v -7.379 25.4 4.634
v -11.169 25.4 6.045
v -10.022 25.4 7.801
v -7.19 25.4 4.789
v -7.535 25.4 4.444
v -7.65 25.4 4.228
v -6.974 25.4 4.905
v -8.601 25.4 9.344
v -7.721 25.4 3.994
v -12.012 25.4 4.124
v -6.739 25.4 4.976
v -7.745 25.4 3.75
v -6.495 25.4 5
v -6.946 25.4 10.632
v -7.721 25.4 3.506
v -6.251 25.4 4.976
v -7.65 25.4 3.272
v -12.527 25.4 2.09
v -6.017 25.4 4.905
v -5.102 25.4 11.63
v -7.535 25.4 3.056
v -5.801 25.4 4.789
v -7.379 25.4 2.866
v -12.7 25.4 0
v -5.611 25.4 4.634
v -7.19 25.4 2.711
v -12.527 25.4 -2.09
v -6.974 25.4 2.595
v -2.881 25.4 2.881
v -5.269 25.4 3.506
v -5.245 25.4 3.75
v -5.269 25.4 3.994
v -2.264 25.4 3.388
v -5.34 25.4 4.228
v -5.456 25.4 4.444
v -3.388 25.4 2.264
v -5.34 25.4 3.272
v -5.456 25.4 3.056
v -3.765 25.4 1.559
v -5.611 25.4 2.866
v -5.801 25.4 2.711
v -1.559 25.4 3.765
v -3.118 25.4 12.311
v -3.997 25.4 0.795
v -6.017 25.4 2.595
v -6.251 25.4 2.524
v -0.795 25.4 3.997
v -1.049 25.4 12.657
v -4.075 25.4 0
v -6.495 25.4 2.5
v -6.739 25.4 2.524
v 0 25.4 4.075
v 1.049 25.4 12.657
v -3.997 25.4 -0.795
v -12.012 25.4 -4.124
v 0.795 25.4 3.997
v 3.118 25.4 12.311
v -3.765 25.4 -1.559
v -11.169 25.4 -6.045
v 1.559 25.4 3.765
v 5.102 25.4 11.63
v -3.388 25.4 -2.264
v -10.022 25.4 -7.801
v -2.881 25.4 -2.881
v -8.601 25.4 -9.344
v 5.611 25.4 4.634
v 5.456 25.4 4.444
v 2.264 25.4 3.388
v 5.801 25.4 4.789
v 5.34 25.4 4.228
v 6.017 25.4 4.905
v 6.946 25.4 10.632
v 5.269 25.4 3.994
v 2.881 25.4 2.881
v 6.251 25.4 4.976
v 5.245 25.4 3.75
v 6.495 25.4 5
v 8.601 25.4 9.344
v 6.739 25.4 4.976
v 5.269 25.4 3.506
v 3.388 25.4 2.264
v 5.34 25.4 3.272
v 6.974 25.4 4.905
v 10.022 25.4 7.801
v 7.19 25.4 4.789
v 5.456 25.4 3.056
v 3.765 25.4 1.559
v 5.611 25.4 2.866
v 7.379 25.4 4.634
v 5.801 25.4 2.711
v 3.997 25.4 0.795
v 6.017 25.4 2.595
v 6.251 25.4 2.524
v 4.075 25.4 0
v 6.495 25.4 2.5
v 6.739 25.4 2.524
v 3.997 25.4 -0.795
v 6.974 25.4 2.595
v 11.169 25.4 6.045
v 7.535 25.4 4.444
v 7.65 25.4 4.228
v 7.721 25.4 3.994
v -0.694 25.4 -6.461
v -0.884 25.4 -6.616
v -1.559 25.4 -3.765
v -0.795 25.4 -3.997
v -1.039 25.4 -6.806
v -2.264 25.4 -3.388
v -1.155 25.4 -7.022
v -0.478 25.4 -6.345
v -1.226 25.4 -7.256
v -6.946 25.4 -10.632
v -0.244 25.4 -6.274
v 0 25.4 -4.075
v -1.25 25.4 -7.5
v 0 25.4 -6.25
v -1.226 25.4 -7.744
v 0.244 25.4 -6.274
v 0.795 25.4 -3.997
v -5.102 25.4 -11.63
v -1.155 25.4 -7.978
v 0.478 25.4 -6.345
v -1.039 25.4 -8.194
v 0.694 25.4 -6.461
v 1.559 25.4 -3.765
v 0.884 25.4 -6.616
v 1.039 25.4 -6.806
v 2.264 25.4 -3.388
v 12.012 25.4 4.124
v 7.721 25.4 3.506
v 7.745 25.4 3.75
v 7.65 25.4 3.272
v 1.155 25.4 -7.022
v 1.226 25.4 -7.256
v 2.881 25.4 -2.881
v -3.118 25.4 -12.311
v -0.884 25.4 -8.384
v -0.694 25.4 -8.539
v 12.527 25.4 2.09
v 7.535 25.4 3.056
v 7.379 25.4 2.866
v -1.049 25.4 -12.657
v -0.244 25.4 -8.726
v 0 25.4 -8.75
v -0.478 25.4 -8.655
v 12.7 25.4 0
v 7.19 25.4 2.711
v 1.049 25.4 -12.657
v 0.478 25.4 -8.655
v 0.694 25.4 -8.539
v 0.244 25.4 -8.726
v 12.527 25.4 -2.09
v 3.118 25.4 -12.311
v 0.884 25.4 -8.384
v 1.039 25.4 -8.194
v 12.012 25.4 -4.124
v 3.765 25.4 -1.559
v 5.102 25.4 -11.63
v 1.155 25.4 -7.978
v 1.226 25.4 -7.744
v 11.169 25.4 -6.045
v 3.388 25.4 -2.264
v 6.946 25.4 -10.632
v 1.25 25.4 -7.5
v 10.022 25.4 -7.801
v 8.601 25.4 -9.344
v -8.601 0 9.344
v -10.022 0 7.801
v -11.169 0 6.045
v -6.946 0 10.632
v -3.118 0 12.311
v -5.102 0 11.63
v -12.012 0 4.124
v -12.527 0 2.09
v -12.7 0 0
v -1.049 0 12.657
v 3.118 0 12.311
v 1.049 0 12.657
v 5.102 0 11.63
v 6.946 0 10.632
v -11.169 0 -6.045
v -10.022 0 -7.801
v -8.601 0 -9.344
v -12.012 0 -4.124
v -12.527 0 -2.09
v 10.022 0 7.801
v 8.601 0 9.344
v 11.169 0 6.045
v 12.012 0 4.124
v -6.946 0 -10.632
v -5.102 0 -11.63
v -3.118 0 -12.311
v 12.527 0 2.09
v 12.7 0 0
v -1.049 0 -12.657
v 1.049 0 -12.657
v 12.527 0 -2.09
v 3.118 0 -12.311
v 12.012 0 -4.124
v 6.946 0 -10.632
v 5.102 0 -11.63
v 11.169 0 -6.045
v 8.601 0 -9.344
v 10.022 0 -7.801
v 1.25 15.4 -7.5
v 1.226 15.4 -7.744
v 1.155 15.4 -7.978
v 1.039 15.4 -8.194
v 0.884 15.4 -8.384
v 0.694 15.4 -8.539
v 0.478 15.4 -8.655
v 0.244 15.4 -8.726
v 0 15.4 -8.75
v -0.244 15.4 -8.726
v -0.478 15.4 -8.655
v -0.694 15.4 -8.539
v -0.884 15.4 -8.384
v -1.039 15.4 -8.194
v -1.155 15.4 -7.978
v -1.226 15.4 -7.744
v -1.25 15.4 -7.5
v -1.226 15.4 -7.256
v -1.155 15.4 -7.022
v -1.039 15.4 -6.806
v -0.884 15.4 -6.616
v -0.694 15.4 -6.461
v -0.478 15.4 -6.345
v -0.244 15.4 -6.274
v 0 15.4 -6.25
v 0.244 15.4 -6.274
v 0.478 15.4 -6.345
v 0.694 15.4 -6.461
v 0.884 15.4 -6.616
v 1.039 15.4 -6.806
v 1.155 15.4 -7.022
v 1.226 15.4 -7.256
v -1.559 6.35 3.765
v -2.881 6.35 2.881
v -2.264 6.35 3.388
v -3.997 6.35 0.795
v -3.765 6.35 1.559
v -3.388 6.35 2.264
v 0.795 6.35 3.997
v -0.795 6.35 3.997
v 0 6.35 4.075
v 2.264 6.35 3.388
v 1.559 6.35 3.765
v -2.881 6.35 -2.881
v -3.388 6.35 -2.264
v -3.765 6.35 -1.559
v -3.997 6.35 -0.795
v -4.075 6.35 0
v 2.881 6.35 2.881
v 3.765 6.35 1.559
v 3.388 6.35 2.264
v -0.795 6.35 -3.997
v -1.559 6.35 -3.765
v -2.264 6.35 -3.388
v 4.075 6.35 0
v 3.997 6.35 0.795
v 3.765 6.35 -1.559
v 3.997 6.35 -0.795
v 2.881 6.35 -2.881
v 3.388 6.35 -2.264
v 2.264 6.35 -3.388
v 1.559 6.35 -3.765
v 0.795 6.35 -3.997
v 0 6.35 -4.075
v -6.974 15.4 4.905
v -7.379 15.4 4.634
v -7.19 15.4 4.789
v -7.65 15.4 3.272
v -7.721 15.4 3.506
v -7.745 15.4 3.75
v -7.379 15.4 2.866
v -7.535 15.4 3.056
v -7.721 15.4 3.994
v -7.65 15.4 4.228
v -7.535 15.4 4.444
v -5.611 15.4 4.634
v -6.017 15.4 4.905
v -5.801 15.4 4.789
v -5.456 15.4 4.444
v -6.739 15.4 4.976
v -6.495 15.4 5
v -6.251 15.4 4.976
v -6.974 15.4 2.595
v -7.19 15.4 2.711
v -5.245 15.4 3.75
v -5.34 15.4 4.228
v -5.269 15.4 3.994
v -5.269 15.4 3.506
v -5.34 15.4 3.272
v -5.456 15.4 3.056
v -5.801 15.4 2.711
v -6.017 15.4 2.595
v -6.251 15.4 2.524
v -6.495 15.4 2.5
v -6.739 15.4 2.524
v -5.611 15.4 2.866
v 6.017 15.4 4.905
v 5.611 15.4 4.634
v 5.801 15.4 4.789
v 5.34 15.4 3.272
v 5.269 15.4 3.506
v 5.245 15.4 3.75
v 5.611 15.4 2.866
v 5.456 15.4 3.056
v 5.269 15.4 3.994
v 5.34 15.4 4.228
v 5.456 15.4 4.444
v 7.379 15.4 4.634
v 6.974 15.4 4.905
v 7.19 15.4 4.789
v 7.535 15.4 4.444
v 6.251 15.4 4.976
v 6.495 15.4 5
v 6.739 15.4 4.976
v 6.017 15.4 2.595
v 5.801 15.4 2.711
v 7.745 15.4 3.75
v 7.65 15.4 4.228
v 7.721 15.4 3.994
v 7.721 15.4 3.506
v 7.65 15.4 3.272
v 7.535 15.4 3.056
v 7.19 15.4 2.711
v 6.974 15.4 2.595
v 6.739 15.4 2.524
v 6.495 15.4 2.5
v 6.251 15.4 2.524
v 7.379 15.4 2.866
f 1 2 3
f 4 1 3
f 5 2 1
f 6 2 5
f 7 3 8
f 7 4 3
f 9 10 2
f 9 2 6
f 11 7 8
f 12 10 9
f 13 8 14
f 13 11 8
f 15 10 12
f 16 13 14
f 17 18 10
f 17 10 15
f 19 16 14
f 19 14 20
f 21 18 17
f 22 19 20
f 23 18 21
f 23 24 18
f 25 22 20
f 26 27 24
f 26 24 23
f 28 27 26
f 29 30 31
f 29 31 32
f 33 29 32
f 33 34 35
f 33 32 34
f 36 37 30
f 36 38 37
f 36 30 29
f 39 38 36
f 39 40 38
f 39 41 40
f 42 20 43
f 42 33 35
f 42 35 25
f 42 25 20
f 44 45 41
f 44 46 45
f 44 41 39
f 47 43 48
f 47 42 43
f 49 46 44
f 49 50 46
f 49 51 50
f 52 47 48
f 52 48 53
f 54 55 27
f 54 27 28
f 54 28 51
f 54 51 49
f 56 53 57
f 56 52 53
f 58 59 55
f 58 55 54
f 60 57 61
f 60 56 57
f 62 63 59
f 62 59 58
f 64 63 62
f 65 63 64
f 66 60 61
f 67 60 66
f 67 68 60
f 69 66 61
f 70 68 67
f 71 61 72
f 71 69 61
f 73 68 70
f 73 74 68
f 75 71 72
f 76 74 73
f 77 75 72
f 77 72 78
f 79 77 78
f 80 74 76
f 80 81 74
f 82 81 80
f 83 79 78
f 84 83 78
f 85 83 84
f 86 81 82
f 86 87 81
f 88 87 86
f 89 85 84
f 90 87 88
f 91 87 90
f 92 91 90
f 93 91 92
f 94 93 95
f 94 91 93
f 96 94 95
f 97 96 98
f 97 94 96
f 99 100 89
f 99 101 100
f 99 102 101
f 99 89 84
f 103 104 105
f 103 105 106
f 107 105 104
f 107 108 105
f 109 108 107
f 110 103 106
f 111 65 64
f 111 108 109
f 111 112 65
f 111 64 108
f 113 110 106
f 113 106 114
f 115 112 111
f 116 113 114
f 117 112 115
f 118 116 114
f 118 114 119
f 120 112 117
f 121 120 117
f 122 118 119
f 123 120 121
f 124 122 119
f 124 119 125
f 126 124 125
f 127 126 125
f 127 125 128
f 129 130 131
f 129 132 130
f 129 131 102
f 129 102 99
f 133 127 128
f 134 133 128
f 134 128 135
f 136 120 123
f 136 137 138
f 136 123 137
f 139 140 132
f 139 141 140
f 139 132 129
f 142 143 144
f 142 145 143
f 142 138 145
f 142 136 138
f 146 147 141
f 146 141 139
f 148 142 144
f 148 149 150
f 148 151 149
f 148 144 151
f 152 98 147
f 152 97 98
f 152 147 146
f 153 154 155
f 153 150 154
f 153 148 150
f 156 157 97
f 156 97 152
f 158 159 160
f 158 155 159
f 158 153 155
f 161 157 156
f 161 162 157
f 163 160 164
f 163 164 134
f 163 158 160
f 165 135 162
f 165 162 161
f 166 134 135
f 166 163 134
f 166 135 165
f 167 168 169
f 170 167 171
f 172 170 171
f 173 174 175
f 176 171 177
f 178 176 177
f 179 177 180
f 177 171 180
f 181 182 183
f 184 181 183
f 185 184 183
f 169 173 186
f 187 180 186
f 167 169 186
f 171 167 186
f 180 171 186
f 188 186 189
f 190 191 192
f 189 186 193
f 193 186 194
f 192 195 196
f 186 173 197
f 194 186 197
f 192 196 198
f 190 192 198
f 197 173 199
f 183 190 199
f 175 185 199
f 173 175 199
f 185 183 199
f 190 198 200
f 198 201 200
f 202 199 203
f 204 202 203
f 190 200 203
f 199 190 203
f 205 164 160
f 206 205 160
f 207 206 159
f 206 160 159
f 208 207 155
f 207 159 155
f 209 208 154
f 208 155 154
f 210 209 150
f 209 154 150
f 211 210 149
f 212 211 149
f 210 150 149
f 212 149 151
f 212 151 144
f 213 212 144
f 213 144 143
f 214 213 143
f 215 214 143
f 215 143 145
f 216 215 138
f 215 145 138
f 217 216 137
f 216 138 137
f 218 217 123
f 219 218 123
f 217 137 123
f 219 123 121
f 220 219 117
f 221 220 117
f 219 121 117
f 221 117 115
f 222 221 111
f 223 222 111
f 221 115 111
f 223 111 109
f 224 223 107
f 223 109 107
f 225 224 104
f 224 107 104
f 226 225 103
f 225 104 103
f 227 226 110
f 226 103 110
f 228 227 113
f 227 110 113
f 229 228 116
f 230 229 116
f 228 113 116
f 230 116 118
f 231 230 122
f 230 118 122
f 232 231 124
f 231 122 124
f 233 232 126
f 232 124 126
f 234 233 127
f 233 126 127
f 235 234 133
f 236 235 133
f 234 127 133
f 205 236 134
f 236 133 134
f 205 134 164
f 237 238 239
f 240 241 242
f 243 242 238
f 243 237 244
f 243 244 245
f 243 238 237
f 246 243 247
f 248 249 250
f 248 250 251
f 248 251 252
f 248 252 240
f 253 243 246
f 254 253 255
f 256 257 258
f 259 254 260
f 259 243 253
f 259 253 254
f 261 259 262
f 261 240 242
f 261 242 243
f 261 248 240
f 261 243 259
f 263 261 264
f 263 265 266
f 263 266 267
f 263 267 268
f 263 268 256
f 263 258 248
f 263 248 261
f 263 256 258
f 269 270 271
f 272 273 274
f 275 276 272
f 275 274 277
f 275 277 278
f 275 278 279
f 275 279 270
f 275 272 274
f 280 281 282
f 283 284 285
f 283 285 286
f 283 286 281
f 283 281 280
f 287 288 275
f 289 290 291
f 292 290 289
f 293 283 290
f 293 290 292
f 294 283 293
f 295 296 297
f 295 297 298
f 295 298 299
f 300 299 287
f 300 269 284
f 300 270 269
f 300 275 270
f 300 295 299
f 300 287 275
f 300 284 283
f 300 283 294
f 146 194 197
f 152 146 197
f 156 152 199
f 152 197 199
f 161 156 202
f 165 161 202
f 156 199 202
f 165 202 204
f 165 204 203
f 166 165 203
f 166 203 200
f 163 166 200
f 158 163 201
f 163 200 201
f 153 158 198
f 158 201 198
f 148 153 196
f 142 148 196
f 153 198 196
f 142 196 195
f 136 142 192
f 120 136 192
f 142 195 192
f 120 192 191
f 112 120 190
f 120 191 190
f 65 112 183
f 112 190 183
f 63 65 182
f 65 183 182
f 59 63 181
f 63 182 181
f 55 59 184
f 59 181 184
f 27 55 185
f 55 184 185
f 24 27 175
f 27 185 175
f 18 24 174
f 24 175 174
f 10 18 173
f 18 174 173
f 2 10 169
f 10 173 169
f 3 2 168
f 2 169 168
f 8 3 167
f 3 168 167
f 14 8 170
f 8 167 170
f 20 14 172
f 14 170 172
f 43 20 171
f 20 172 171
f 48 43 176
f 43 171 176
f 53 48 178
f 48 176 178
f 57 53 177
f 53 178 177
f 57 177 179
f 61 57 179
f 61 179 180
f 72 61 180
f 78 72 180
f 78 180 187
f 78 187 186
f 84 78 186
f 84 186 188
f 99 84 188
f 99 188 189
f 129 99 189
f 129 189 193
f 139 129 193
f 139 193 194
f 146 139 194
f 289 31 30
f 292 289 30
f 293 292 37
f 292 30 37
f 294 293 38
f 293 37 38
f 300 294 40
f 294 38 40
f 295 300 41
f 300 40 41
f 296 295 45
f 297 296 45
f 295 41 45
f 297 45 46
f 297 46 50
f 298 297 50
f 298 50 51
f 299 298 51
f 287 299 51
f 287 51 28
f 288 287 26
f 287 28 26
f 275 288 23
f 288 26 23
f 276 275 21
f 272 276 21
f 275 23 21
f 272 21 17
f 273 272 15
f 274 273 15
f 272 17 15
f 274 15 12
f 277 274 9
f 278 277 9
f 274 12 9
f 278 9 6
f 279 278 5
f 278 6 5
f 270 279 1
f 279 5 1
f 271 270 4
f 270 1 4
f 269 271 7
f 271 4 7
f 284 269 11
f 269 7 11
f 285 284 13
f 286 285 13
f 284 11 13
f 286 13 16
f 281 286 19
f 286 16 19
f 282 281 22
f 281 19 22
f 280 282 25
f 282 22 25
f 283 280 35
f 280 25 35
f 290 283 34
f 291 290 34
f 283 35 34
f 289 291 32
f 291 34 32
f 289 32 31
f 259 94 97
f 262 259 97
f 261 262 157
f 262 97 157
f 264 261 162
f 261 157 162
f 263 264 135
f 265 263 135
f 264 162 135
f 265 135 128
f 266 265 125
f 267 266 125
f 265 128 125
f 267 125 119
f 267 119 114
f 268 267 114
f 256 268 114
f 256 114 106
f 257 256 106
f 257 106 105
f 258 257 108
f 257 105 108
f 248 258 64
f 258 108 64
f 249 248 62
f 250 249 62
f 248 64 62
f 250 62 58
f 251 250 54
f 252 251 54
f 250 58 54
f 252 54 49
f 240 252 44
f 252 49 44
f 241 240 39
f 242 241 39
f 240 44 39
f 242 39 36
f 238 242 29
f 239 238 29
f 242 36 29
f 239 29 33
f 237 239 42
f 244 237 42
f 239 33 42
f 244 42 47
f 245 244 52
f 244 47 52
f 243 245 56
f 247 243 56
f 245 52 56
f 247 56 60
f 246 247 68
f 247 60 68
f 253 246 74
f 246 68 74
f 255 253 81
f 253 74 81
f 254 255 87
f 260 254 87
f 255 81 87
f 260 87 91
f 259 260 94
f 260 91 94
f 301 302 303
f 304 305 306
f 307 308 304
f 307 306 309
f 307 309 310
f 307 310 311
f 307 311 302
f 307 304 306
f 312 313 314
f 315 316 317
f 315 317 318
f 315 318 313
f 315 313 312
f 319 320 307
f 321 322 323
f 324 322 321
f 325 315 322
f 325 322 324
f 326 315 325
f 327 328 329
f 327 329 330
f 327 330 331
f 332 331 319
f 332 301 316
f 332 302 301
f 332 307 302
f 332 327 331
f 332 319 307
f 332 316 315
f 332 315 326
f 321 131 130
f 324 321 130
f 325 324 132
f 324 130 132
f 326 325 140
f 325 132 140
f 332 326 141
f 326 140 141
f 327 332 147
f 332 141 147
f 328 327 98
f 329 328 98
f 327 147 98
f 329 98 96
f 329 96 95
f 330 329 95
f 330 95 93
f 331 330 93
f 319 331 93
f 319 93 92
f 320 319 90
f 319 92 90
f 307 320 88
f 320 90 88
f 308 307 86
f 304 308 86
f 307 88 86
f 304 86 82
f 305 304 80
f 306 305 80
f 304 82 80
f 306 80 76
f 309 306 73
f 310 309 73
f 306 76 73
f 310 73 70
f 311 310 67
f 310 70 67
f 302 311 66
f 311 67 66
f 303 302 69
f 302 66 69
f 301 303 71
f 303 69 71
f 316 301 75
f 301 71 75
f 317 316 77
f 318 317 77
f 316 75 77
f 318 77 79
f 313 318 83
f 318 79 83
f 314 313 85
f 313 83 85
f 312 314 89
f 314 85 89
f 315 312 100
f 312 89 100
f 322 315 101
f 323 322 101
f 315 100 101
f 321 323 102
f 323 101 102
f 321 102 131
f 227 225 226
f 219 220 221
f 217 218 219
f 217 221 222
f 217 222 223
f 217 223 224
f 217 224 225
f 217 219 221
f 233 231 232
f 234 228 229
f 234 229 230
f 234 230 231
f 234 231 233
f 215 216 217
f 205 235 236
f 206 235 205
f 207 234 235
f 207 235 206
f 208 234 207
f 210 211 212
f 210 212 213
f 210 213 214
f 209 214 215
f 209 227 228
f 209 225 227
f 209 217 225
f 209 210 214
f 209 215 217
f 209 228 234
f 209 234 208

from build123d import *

# Parameters (mm, degrees)
SKETCH1_R           = 12.7
BOSS_EXTRUDE1_DEPTH = 25.4
SKETCH2_R           = 4.075
CUT_EXTRUDE1_DEPTH  = 19.05
SKETCH3_R           = 1.25
CUT_EXTRUDE2_DEPTH  = 10


with BuildPart() as part:
    # Sketch1 → Boss-Extrude1 (new body)
    with BuildSketch(Plane(origin=(0, 0, 0), x_dir=(1, 0, 0), z_dir=(0, 1, 0))):
        Circle(SKETCH1_R)
    extrude(amount=BOSS_EXTRUDE1_DEPTH)

    # Sketch2 → Cut-Extrude1 (cut)
    with BuildSketch(Plane(origin=(0, 25.4, 0), x_dir=(1, 0, 0), z_dir=(0, 1, 0))):
        Circle(SKETCH2_R)
    extrude(amount=-CUT_EXTRUDE1_DEPTH, mode=Mode.SUBTRACT)

    # Sketch3 → Cut-Extrude2 (cut)
    with BuildSketch(Plane(origin=(0, 25.4, 0), x_dir=(1, 0, 0), z_dir=(0, 1, 0))):
        with Locations((0, 7.5)):
            Circle(SKETCH3_R)
        with Locations((6.495190528, -3.75)):
            Circle(SKETCH3_R)
        with Locations((-6.495190528, -3.75)):
            Circle(SKETCH3_R)
    extrude(amount=-CUT_EXTRUDE2_DEPTH, mode=Mode.SUBTRACT)


solid = part.part
